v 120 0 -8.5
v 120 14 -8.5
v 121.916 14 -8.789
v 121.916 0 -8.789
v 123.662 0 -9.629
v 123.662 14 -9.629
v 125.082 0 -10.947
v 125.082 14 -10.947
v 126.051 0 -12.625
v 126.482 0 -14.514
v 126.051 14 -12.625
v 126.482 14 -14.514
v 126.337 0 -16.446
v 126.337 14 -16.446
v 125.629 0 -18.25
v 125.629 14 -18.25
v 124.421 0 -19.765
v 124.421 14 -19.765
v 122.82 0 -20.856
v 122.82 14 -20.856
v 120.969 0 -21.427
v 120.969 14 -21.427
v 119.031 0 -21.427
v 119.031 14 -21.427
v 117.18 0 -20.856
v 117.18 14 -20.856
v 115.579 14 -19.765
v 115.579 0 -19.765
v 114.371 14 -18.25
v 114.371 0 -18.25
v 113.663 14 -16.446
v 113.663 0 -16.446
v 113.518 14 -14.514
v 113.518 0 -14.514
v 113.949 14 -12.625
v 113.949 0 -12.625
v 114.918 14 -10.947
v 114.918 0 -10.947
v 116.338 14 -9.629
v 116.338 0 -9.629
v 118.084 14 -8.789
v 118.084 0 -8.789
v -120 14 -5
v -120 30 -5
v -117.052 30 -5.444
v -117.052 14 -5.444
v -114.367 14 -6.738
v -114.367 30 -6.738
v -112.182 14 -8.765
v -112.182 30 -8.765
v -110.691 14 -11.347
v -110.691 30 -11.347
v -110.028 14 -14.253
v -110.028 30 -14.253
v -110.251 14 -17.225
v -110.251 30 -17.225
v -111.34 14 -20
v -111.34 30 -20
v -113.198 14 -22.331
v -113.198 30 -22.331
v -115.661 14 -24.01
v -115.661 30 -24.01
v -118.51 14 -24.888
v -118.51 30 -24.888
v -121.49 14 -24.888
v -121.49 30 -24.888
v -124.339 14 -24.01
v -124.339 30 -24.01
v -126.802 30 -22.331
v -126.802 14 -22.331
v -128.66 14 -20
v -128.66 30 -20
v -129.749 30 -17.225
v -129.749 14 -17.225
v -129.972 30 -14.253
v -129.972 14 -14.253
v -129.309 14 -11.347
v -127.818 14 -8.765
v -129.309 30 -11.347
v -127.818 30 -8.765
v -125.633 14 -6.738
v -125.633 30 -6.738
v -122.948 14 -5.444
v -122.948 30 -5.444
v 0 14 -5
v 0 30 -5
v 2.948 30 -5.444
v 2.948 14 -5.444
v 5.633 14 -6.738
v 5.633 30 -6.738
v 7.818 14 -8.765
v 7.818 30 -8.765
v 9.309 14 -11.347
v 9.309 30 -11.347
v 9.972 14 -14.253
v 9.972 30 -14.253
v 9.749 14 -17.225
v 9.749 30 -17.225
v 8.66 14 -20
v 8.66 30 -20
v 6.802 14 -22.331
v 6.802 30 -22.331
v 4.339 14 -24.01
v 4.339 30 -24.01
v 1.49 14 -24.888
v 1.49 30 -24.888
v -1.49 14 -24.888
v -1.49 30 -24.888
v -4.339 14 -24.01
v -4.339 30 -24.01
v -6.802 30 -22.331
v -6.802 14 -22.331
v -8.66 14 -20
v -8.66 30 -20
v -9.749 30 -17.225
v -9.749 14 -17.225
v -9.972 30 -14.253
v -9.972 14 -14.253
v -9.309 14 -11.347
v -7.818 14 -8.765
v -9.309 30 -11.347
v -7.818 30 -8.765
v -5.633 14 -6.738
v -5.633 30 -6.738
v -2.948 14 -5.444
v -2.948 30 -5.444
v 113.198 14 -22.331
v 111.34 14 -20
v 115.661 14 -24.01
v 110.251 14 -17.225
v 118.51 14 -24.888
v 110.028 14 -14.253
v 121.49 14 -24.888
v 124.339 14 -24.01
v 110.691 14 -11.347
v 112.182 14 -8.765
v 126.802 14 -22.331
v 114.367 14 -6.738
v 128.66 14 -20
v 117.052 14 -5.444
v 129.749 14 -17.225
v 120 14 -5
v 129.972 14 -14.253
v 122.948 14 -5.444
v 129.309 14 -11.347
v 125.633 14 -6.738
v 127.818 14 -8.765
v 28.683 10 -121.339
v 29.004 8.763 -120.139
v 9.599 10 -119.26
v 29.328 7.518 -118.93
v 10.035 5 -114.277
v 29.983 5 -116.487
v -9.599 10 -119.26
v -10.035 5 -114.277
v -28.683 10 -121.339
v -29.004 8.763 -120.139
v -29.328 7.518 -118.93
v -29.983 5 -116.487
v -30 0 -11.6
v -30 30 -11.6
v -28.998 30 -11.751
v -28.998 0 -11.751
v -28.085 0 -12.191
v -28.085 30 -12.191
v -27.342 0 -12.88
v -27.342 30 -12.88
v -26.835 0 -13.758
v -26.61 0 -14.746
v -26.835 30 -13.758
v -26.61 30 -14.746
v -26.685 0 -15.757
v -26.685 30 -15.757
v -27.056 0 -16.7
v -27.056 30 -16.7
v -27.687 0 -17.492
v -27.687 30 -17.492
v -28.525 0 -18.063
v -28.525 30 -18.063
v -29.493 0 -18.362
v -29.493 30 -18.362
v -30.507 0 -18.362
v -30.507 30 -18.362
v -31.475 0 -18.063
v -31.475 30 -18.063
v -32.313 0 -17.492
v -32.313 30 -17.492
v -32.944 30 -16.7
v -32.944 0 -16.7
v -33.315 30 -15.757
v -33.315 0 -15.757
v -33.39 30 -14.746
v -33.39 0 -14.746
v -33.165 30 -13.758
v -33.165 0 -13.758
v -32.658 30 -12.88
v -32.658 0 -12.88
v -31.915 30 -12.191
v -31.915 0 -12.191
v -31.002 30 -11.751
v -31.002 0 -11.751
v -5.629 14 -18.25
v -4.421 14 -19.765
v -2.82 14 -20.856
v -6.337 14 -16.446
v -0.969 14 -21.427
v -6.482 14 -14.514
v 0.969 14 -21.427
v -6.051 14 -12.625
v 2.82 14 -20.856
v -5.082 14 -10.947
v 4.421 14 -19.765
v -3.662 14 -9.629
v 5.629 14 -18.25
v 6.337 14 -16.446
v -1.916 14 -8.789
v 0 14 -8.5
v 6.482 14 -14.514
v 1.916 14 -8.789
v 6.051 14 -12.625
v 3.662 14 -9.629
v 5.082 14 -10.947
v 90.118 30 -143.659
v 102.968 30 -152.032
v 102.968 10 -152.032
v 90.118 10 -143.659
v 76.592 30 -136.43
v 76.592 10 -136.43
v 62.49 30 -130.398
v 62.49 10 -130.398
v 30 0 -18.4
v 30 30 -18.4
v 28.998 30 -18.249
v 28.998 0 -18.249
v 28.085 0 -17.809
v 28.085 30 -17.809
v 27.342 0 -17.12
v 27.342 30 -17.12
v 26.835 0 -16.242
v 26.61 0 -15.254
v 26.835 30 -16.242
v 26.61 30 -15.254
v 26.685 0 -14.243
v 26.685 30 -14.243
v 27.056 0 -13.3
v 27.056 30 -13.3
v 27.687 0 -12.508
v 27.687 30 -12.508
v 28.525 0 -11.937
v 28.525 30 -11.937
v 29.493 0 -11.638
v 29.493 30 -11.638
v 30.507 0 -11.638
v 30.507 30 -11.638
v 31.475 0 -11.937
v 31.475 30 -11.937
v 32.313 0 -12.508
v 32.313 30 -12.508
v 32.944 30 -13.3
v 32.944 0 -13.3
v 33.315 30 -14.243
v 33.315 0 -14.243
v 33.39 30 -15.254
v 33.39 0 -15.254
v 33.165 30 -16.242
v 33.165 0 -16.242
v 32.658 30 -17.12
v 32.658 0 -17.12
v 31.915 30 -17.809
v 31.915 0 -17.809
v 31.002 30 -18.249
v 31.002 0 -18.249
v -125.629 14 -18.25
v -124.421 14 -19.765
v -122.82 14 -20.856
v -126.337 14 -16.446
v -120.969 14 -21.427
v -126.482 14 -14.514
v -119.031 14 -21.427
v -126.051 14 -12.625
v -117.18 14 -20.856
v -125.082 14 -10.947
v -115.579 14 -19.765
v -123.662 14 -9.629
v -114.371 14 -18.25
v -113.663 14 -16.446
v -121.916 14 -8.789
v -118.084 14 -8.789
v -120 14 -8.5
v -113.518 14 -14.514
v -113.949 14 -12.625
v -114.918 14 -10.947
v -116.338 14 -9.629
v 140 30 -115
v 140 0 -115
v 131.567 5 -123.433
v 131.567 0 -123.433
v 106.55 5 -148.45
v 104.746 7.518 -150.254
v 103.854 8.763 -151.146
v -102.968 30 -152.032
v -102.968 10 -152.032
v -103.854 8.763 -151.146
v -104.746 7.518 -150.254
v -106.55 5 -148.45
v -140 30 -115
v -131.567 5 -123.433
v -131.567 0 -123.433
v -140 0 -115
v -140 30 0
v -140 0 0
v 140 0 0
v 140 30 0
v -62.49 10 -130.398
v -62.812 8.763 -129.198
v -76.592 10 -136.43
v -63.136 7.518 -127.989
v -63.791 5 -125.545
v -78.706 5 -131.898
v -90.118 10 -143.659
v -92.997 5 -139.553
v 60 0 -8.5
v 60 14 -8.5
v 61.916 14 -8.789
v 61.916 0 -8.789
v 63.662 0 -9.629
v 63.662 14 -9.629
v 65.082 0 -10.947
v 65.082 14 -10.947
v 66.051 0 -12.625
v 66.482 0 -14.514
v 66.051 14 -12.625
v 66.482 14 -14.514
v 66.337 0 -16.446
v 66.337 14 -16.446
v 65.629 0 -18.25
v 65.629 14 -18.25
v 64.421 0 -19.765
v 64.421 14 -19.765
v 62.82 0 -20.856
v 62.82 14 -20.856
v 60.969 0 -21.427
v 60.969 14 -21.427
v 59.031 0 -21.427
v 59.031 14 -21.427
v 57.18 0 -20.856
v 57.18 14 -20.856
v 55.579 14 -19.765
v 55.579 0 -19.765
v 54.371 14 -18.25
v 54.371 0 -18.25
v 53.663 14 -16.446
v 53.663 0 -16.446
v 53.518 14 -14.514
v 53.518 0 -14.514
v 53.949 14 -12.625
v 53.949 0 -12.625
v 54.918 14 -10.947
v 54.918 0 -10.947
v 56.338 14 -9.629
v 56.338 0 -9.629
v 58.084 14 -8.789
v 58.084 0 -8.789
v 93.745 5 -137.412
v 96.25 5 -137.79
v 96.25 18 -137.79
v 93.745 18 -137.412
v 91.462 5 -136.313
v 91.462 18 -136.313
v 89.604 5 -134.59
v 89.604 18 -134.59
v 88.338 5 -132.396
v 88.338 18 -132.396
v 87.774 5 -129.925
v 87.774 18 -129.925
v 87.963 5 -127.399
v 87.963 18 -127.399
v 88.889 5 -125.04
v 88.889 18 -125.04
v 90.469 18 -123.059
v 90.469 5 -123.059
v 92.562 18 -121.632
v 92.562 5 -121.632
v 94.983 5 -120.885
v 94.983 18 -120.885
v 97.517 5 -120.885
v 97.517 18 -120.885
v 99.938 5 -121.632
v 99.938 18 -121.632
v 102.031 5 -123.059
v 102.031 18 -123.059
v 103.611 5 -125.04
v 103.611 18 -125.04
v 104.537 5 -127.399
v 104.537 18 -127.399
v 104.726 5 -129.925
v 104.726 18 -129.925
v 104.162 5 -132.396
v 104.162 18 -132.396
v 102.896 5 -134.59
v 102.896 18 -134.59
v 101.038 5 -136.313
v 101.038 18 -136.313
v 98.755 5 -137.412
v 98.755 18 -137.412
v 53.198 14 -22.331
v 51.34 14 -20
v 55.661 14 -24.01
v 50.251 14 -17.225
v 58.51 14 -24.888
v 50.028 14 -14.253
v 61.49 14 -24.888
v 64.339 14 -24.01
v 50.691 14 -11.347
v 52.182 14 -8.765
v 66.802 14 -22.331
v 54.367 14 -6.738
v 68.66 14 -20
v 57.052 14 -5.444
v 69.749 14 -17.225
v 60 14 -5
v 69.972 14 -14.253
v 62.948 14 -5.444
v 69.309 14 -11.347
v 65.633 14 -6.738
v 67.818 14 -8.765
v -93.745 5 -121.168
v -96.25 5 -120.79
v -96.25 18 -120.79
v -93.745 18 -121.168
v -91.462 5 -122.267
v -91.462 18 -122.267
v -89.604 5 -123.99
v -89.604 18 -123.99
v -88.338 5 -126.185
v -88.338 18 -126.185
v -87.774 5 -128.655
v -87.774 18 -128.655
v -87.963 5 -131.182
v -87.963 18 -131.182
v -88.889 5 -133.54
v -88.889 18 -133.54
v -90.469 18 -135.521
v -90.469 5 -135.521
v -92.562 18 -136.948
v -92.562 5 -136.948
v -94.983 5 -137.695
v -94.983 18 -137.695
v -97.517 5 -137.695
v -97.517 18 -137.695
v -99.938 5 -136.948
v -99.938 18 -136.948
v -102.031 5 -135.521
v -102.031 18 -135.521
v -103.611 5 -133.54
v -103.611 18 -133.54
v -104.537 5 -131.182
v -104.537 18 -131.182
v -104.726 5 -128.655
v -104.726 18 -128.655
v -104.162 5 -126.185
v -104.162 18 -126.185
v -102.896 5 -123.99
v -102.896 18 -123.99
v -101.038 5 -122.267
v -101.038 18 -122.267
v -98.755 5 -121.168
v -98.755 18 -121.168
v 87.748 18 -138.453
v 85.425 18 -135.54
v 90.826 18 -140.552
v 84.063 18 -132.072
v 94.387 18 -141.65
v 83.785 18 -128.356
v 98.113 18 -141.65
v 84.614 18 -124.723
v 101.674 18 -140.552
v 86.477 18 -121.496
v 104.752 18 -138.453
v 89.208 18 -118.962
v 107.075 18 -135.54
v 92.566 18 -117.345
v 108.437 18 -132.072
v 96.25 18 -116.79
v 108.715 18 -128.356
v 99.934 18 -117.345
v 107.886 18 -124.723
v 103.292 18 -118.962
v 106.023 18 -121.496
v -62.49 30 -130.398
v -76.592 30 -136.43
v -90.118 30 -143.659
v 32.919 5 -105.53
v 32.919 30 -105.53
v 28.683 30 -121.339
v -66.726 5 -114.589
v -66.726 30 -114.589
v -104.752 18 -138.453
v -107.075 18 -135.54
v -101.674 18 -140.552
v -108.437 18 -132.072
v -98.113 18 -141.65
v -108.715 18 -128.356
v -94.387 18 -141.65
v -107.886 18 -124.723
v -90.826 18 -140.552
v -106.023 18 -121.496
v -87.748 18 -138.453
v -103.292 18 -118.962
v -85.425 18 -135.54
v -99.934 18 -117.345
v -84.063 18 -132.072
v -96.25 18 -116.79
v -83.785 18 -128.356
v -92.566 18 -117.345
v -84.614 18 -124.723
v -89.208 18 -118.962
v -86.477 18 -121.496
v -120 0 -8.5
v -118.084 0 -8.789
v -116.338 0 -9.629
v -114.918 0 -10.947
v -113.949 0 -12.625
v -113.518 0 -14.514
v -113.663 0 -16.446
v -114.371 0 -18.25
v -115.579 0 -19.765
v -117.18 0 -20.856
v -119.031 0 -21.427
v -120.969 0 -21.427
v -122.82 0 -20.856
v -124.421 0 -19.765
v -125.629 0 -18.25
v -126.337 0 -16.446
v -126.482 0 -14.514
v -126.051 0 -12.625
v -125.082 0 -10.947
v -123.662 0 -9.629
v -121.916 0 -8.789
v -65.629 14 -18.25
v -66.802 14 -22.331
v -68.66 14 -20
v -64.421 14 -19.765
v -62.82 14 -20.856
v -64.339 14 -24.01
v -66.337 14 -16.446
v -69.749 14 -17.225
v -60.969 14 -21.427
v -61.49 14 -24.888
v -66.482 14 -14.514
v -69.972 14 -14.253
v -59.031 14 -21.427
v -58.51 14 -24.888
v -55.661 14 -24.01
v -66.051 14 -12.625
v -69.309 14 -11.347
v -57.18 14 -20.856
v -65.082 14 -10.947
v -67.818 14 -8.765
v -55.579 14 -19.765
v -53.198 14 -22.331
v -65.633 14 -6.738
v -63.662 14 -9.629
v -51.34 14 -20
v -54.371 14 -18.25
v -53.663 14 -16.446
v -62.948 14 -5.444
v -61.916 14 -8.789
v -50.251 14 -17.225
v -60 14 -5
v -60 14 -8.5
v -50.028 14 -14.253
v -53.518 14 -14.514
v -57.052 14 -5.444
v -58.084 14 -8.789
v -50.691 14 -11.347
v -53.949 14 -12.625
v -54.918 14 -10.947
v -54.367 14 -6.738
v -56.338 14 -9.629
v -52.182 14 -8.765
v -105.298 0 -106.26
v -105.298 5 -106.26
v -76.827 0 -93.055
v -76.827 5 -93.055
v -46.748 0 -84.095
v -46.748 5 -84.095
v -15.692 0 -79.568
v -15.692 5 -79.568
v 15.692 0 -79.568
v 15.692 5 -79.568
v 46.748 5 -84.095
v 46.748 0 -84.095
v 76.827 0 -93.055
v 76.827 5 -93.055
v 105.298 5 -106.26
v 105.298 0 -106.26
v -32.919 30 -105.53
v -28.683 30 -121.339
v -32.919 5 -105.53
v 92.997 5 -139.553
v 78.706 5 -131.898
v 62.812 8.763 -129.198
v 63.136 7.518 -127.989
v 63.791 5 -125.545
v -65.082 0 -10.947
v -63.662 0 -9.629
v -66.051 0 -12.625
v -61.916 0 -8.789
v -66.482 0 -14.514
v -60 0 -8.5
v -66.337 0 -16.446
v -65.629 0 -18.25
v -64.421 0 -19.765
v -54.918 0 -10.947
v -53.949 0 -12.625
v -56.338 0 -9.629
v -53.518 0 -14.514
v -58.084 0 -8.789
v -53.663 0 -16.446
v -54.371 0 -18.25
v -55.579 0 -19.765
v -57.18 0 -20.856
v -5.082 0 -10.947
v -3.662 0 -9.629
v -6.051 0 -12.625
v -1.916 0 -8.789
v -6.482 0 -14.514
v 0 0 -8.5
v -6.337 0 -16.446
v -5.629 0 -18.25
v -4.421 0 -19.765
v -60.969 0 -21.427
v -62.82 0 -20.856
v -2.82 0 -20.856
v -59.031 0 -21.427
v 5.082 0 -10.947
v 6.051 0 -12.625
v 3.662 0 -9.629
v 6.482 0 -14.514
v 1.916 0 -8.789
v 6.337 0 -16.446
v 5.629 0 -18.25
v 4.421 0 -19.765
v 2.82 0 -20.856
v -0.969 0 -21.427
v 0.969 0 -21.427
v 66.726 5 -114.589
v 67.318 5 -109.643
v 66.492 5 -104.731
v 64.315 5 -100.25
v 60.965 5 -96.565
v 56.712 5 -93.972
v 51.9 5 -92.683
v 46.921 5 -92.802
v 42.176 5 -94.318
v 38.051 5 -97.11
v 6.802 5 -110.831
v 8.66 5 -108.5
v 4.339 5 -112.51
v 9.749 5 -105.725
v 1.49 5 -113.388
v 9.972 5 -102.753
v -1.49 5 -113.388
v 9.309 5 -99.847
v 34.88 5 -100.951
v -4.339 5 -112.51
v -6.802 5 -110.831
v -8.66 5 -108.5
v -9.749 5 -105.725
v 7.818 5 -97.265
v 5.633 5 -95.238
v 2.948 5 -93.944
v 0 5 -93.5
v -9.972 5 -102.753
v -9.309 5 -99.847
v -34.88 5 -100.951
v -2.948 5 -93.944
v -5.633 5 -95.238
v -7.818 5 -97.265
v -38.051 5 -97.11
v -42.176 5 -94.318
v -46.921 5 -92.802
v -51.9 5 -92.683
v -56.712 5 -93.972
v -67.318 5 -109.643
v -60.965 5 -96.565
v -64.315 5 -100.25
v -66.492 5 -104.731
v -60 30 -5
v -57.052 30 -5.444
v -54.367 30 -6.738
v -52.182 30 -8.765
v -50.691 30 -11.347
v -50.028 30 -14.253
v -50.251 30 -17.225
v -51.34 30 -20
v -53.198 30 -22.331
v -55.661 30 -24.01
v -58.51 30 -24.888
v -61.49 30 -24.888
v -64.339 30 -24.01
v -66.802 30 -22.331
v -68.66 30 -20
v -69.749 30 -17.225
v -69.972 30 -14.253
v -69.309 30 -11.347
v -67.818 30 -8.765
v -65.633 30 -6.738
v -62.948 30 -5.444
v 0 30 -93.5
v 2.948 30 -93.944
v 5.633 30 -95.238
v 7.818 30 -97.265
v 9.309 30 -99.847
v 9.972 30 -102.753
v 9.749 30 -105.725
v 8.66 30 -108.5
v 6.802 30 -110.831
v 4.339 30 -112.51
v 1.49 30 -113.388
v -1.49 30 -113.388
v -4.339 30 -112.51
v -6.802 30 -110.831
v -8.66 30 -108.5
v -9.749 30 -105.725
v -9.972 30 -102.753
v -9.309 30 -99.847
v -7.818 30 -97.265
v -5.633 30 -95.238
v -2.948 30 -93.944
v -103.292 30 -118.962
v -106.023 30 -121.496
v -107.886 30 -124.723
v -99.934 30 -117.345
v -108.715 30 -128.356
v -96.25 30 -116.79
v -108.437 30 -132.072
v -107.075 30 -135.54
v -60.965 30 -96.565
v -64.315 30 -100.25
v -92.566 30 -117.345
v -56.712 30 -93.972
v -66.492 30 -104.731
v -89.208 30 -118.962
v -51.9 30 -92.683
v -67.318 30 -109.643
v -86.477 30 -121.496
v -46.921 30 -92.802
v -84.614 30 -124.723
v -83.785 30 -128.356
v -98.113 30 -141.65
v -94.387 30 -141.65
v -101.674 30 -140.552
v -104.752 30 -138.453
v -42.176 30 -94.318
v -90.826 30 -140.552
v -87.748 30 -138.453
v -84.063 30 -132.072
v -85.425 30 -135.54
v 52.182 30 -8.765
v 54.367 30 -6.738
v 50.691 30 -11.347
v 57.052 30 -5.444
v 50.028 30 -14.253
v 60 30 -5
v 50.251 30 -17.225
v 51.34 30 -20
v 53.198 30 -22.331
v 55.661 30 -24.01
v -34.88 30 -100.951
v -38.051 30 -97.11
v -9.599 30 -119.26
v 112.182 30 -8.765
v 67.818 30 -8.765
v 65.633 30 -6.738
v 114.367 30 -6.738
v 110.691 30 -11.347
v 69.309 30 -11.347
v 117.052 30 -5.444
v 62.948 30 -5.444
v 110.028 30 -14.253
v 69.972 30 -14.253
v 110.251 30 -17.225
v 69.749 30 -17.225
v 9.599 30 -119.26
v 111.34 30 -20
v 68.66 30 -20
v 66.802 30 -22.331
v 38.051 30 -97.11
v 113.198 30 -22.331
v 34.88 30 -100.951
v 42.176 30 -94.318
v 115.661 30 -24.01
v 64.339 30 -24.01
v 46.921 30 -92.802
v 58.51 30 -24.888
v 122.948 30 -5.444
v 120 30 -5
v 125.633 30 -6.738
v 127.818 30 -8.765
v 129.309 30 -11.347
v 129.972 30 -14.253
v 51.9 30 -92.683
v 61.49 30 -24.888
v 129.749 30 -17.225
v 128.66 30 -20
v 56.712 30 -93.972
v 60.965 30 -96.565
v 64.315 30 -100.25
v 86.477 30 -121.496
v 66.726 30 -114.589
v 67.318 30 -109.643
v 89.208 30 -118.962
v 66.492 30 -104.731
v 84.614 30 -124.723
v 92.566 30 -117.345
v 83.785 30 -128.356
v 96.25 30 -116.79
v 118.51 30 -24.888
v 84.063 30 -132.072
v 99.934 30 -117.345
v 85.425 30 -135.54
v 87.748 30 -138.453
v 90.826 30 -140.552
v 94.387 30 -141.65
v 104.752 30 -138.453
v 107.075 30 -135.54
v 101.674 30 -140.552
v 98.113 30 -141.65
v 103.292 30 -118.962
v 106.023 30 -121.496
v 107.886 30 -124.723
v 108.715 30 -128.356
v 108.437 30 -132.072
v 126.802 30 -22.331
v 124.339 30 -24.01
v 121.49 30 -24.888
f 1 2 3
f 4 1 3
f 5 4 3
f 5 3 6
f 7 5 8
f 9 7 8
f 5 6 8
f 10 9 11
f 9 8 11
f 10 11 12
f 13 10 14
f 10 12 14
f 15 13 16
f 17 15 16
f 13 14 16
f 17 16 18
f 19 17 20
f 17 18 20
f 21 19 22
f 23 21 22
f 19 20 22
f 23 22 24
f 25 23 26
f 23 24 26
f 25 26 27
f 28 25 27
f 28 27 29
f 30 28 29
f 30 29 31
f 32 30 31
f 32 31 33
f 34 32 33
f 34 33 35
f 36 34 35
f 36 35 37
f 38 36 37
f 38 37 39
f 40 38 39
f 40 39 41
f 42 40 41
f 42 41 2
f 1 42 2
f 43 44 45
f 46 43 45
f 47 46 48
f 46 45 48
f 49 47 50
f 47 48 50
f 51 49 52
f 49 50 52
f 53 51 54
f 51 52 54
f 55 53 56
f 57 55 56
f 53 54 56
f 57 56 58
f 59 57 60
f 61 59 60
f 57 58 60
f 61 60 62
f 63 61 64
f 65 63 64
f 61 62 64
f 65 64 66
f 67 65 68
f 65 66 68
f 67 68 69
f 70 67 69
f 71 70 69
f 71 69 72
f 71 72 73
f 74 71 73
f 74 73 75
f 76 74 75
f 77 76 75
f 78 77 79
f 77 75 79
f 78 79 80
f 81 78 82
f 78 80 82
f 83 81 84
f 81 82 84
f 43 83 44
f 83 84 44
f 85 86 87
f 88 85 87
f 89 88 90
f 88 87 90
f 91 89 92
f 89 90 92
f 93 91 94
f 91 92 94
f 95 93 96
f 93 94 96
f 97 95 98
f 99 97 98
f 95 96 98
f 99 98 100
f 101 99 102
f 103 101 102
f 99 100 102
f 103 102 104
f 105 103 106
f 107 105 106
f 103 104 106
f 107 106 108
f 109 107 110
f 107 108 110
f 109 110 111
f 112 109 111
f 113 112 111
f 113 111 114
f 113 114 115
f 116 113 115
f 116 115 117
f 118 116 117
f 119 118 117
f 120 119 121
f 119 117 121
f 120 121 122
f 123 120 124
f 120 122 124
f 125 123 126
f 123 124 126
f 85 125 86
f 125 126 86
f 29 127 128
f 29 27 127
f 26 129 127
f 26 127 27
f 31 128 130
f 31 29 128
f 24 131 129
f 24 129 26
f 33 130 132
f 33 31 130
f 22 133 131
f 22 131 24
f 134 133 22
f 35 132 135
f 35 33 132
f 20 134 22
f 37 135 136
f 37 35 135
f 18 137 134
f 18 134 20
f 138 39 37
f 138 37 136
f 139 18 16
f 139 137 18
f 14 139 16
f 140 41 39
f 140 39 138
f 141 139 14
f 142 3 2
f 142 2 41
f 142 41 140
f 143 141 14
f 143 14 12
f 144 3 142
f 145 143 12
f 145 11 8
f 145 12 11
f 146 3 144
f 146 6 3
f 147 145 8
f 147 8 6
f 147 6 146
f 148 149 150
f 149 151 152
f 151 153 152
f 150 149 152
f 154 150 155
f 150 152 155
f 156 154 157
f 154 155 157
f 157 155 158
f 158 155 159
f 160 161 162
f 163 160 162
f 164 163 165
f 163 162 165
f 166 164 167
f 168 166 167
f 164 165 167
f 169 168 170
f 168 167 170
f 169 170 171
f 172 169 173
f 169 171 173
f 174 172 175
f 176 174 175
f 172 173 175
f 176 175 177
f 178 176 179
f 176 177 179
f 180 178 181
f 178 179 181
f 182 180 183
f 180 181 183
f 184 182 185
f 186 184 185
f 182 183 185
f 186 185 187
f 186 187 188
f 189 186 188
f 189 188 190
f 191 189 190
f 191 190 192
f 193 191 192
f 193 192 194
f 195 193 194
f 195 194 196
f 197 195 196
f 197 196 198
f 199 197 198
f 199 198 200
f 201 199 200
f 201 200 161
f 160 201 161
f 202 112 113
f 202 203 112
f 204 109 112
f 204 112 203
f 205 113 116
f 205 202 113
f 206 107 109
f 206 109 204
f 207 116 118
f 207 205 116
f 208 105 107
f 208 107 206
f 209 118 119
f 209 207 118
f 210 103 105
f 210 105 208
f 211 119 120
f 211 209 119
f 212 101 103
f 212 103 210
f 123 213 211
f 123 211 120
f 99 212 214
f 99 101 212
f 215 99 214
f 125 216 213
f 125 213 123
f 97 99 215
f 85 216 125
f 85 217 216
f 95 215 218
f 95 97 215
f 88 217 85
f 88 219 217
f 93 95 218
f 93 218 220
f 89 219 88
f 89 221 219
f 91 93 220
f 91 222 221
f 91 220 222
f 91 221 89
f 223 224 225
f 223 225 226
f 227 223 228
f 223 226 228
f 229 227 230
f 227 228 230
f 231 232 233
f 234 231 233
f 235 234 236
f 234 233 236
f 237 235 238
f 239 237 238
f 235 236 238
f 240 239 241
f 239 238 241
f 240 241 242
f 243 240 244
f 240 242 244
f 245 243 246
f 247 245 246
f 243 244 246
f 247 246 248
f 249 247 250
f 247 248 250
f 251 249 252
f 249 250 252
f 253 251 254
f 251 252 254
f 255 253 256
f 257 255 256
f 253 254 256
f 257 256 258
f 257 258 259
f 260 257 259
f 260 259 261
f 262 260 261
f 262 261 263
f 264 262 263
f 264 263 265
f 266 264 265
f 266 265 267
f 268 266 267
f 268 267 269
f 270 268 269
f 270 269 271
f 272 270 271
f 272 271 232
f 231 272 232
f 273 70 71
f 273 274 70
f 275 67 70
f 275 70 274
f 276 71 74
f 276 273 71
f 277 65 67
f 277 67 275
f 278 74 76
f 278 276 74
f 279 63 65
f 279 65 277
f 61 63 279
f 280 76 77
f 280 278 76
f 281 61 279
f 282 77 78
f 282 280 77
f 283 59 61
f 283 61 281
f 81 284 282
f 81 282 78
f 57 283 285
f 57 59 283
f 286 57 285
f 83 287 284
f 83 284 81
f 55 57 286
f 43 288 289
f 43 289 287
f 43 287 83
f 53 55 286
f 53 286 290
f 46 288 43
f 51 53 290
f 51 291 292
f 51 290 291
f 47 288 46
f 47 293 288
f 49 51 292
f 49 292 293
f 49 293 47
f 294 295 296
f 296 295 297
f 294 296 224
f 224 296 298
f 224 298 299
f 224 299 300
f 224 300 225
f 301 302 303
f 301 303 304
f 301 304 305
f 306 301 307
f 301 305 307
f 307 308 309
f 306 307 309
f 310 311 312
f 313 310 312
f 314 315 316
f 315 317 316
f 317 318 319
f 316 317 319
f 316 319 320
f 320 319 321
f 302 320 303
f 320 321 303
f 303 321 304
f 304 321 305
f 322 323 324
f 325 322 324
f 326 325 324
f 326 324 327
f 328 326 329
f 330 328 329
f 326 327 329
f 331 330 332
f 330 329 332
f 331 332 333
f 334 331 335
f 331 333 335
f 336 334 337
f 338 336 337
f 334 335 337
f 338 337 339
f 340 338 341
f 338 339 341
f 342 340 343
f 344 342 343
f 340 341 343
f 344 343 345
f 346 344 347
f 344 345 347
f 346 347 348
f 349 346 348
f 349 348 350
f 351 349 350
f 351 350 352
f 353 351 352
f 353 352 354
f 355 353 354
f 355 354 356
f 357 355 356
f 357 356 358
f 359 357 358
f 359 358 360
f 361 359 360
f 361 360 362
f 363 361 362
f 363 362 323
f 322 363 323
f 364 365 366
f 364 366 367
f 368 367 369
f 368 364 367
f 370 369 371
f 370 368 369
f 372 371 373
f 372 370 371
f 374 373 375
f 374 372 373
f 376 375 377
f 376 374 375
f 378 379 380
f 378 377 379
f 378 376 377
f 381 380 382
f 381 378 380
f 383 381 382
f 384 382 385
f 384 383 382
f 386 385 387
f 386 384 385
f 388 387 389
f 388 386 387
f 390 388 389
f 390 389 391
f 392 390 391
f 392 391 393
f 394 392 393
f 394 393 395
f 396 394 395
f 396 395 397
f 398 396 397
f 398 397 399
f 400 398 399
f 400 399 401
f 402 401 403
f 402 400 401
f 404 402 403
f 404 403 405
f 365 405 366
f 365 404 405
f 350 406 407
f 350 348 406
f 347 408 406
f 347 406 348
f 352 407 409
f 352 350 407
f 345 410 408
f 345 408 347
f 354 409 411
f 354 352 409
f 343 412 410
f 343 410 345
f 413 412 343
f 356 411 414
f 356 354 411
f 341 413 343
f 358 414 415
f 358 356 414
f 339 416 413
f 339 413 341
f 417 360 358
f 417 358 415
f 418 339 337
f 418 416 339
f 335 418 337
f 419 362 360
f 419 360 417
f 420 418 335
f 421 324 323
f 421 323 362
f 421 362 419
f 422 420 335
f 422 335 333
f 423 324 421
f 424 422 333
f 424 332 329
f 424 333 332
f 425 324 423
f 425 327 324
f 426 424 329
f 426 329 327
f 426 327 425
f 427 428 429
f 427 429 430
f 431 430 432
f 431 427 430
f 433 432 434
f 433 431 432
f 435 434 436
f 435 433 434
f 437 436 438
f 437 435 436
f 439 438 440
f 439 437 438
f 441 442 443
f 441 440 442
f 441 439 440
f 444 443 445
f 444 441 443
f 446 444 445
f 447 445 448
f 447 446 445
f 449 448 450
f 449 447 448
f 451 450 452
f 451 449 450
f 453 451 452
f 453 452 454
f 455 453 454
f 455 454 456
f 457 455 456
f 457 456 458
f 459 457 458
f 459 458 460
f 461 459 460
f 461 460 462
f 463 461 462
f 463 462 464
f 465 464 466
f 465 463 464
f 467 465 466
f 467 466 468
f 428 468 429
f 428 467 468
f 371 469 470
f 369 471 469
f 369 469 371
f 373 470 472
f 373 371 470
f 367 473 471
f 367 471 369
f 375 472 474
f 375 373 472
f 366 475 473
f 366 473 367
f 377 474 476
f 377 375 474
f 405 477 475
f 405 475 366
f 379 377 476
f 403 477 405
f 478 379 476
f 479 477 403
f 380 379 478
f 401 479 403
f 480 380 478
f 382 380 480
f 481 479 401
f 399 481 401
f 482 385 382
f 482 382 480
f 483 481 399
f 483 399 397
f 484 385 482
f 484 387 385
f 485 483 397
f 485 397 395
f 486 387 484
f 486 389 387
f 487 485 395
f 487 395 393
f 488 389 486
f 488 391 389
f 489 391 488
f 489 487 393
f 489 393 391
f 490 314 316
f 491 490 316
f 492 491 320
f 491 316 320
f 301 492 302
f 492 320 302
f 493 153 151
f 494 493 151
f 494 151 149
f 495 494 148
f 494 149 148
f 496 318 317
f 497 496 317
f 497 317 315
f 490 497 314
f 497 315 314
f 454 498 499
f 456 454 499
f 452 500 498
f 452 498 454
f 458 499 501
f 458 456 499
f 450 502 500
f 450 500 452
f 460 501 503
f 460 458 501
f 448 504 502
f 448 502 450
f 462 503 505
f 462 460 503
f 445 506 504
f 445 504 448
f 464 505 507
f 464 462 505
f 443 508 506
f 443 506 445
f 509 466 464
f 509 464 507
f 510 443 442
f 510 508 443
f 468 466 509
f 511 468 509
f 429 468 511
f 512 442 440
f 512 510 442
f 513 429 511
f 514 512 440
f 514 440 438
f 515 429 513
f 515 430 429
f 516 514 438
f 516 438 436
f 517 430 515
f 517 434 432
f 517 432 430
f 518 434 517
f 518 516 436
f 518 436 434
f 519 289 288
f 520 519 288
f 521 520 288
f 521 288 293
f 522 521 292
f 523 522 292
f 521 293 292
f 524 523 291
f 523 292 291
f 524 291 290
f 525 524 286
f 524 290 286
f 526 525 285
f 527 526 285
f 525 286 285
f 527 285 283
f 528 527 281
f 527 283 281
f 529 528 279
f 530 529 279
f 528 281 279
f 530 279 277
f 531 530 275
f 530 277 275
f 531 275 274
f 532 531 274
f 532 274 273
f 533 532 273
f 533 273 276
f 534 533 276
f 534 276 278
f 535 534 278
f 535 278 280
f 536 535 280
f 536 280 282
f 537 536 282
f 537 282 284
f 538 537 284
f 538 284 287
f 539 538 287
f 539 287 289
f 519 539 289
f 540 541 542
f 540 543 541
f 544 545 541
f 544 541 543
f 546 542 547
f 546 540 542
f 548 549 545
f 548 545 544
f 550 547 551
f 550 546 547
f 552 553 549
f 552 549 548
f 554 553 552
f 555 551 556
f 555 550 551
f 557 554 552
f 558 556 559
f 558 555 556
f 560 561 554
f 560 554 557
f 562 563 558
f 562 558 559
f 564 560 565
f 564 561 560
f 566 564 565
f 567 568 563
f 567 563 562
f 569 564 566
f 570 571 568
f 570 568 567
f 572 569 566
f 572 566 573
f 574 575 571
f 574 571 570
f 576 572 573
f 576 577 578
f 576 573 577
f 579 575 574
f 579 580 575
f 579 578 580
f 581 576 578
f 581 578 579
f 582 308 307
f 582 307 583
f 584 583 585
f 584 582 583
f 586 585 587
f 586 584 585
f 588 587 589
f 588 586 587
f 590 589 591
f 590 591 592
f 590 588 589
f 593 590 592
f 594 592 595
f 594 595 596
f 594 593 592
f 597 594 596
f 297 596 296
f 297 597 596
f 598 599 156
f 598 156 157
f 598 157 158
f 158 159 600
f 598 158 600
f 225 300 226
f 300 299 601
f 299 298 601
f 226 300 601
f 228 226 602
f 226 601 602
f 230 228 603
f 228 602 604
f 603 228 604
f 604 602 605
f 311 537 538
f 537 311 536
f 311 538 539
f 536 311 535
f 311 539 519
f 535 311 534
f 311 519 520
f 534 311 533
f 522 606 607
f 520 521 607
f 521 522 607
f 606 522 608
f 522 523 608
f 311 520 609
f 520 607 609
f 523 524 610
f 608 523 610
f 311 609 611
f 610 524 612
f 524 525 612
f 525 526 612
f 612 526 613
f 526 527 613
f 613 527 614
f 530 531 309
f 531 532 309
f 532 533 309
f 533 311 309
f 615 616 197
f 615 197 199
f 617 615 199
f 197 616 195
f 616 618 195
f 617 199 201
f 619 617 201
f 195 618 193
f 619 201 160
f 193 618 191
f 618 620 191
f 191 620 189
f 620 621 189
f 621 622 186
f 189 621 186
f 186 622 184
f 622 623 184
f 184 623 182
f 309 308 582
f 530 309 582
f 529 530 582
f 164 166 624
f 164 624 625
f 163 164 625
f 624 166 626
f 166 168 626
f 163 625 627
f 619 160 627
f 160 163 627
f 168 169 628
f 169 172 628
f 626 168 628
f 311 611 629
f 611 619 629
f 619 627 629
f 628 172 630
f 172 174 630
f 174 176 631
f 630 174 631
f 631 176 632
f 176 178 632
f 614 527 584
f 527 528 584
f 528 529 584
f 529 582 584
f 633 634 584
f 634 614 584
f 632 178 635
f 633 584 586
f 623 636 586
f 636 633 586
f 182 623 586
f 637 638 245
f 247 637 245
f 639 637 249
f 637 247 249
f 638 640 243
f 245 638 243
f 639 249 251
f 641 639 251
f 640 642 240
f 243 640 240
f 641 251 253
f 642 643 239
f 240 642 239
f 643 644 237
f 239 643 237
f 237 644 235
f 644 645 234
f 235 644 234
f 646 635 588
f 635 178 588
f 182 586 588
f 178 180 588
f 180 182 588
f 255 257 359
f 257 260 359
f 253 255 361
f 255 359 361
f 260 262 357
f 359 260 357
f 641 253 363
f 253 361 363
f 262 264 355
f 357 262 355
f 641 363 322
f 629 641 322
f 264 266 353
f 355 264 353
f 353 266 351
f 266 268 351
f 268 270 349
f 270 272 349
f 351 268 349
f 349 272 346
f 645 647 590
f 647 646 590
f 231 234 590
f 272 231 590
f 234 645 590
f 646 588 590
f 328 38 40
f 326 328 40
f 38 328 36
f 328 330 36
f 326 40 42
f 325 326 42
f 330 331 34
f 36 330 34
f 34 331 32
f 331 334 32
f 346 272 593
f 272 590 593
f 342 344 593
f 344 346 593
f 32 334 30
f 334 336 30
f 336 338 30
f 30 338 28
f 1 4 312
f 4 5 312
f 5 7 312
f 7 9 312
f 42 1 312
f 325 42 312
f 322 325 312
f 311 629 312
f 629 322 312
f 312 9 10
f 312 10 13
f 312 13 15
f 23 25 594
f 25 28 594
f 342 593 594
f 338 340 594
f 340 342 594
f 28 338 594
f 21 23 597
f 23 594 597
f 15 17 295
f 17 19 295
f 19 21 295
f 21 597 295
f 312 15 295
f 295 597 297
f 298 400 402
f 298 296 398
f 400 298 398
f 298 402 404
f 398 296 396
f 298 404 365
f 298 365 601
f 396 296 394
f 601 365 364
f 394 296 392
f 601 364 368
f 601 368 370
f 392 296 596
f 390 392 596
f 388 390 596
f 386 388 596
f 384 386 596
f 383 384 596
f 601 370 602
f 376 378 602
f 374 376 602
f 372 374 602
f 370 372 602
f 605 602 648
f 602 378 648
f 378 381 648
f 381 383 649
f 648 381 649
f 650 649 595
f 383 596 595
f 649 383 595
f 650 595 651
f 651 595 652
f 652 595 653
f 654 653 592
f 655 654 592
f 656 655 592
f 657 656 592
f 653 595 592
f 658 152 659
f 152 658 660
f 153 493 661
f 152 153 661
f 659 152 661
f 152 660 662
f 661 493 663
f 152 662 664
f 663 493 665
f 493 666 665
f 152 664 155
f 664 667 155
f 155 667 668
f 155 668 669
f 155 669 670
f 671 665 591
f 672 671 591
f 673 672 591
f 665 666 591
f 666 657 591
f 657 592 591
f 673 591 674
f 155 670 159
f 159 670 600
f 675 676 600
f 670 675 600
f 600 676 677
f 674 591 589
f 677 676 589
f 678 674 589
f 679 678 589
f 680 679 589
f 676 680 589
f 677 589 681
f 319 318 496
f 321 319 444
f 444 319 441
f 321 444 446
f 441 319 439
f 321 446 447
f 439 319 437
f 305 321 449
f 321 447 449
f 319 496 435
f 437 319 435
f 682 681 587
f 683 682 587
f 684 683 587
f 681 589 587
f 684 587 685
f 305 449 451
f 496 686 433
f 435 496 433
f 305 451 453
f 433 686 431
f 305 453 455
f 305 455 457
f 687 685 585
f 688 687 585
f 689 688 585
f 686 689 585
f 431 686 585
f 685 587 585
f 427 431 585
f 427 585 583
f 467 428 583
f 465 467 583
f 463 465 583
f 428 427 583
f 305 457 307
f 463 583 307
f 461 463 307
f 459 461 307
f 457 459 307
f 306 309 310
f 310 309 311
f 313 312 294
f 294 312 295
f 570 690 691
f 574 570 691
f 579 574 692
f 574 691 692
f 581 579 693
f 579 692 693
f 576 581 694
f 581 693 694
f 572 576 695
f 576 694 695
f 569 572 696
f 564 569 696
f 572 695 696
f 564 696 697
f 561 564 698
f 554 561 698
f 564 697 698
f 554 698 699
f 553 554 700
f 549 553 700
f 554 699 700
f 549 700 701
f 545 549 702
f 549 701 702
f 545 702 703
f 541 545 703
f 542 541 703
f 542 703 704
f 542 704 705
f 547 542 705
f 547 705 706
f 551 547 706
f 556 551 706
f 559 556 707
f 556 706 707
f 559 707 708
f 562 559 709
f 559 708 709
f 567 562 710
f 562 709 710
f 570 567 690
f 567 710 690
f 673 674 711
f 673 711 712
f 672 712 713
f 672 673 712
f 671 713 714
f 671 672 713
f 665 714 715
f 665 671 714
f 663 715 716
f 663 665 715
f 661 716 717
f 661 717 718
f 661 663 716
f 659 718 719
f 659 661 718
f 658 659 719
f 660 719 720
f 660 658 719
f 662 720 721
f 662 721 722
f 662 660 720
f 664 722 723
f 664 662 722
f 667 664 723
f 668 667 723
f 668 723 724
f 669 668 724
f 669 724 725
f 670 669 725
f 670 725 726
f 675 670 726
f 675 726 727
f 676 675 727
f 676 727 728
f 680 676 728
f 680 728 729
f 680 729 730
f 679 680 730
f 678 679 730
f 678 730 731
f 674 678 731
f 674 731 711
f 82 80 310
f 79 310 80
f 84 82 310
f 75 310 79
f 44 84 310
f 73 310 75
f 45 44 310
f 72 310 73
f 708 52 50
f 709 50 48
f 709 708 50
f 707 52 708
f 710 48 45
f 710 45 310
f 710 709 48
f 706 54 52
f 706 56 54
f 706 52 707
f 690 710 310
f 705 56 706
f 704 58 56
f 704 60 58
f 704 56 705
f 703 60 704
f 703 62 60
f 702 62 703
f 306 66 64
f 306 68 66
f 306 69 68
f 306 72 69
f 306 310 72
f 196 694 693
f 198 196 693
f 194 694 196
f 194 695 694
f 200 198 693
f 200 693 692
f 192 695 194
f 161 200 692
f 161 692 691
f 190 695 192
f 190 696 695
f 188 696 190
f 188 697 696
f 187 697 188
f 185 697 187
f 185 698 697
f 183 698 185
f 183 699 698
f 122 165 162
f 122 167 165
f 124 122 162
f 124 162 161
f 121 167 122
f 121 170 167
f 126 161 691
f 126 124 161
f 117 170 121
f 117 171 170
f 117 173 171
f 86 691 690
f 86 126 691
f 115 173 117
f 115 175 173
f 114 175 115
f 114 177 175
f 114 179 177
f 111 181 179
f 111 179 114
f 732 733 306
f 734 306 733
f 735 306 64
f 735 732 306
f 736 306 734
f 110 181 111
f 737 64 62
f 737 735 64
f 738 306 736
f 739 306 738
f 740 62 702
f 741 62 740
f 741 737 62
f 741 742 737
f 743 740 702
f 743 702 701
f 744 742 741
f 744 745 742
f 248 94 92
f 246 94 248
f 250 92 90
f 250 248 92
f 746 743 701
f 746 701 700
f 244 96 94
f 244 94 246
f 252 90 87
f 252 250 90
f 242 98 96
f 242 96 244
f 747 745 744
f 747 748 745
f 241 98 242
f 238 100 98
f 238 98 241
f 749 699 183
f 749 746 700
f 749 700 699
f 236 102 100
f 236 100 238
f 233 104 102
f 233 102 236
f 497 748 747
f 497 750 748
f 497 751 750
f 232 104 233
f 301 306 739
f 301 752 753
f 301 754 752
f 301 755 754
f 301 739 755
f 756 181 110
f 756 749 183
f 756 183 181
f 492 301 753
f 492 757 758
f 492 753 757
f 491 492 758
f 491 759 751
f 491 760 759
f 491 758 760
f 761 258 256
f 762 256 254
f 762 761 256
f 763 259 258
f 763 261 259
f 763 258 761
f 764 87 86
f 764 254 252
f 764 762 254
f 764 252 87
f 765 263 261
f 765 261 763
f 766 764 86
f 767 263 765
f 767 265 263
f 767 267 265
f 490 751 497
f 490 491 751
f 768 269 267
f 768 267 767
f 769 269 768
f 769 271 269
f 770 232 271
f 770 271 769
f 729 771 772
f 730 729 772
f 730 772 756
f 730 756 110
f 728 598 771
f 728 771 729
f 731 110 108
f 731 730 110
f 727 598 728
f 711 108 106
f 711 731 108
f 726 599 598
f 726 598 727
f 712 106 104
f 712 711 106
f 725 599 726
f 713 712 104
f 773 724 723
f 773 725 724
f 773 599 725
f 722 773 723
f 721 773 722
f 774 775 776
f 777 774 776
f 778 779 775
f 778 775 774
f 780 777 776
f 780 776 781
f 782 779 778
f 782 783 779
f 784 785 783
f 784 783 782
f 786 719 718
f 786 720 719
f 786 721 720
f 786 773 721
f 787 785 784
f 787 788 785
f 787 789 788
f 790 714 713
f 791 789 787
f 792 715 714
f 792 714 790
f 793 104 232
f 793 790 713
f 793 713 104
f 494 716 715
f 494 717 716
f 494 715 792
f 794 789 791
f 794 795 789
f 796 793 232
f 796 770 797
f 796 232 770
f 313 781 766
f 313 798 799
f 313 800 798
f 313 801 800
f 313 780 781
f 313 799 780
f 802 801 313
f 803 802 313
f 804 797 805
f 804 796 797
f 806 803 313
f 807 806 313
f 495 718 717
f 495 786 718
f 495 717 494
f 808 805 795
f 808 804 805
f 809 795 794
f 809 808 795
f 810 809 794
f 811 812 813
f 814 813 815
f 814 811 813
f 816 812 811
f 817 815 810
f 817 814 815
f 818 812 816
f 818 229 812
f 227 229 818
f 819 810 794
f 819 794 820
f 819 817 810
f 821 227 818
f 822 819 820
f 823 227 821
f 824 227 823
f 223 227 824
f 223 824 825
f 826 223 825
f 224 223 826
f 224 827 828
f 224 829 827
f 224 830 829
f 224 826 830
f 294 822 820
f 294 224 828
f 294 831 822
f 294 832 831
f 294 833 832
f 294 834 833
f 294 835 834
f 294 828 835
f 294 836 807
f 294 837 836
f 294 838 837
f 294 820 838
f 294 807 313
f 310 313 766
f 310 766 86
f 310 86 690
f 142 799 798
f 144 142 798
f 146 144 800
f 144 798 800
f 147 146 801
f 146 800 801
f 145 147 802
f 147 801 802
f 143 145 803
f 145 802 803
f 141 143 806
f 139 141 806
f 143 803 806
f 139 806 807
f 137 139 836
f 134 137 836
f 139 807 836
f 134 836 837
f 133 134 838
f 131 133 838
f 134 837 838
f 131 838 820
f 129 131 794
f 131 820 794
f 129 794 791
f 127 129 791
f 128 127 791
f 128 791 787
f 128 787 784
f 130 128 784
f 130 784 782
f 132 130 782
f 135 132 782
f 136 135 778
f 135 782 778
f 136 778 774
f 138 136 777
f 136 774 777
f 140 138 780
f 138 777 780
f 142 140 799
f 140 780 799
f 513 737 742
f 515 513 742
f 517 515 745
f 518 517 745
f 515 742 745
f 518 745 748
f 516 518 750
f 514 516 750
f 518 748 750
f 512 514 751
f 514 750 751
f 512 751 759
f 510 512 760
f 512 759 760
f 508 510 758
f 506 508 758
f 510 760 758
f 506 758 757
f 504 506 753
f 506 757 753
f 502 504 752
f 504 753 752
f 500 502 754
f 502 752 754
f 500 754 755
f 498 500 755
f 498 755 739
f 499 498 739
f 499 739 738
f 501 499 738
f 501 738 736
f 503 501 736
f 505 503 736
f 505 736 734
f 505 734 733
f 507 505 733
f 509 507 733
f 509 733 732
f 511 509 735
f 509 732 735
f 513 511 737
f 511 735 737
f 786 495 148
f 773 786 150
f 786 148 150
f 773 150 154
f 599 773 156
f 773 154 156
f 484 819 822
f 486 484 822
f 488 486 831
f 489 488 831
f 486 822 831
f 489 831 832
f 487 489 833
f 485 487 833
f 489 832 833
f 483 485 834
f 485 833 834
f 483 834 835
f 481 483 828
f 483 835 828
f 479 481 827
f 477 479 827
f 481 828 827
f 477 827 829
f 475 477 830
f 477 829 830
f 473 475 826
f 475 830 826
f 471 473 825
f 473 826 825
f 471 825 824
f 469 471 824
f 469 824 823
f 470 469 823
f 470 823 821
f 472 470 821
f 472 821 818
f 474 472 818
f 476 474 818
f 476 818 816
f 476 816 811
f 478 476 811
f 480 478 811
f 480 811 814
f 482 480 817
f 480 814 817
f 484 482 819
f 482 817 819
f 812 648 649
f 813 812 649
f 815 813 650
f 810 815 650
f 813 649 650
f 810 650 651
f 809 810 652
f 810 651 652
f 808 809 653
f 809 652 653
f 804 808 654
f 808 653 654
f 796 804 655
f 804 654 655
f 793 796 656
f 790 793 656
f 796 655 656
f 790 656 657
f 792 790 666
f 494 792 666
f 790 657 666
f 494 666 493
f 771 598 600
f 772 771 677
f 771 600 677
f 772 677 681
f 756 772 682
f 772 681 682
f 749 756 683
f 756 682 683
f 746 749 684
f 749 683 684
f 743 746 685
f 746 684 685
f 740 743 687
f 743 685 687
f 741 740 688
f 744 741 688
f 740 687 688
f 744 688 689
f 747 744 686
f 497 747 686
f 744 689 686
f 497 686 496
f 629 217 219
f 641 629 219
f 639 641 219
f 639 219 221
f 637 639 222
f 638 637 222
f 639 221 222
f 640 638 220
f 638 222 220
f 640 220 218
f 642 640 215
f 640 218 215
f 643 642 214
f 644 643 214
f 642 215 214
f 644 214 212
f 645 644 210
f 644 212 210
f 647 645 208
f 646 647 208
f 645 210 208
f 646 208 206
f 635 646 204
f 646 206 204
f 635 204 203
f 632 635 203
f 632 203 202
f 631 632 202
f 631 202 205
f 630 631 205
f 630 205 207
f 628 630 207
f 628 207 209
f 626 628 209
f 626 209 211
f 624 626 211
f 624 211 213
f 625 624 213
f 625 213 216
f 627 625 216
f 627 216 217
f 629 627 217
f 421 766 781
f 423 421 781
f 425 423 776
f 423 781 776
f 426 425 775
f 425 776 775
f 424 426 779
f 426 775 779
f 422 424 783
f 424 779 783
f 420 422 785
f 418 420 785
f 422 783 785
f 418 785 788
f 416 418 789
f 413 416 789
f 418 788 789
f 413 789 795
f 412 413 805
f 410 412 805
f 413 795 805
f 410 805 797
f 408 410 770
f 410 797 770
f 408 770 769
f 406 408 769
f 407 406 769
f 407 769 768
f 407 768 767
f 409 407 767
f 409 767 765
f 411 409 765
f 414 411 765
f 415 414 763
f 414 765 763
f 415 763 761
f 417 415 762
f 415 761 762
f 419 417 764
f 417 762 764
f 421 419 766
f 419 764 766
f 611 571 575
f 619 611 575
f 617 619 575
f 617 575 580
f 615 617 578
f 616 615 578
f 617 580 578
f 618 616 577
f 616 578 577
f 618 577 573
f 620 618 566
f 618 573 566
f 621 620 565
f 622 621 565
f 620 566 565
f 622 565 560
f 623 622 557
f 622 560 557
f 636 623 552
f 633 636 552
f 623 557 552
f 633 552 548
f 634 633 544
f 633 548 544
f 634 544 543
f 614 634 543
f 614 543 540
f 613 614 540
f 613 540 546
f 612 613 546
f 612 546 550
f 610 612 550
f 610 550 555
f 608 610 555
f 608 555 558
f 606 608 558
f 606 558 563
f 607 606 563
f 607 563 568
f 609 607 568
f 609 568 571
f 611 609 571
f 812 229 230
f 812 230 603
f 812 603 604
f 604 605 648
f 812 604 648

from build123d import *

# Parameters (mm, degrees)
SKETCH_1_R             = 10
SKETCH_1_R_2           = 8.5
EXTRUDE_1_DEPTH        = 30
SKETCH_3_R             = 12.5
CUT_EXTRUDE_1_DEPTH    = 12
CUT_EXTRUDE_2_REACH    = 210.839
SKETCH_4_R             = 6.5
SKETCH_5_R             = 10
CUT_EXTRUDE_3_DEPTH    = 16
PATTERN_LINEAR_1_COUNT = 5
PATTERN_LINEAR_1_PITCH = 60
CUT_EXTRUDE_4_REACH    = 210.839
SKETCH_6_R             = 3.4
CUT_EXTRUDE_5_DEPTH    = 5
CHAMFER_1_SIZE         = 5


with BuildPart() as part:
    # 草图1 → 凸台-拉伸1 (new body)
    with BuildSketch(Plane(origin=(0, 0, 0), x_dir=(1, 0, 0), z_dir=(0, 1, 0))):
        with BuildLine():
            Line((-140, 0), (140, 0))
            Line((140, 0), (140, 115))
            Line((140, 115), (102.967607088, 152.032392912))
            ThreePointArc((102.967607088, 152.032392912), (83.433104198, 139.897735045), (62.490215343, 130.398149206))
            Line((62.490215343, 130.398149206), (66.726368142, 114.588611729))
            ThreePointArc((66.726368142, 114.588611729), (54.351999472, 93.155576479), (32.918964222, 105.52994515))
            Line((32.918964222, 105.52994515), (28.682811422, 121.339482627))
            ThreePointArc((28.682811422, 121.339482627), (0, 119), (-28.682811422, 121.339482627))
            Line((-28.682811422, 121.339482627), (-32.918964222, 105.52994515))
            ThreePointArc((-32.918964222, 105.52994515), (-54.351999472, 93.155576479), (-66.726368142, 114.588611729))
            Line((-66.726368142, 114.588611729), (-62.490215343, 130.398149206))
            ThreePointArc((-62.490215343, 130.398149206), (-83.433104198, 139.897735045), (-102.967607088, 152.032392912))
            Line((-102.967607088, 152.032392912), (-140, 115))
            Line((-140, 115), (-140, 0))
        make_face()
        with Locations(Location((0, 103.5, 0), (0, 0, 270))):
            Circle(SKETCH_1_R, mode=Mode.SUBTRACT)
        with Locations(Location((-96.25, 129.290109771, 0), (0, 0, 270))):
            Circle(SKETCH_1_R_2, mode=Mode.SUBTRACT)
        with Locations(Location((96.25, 129.290109771, 0), (0, 0, 90))):
            Circle(SKETCH_1_R_2, mode=Mode.SUBTRACT)
    extrude(amount=EXTRUDE_1_DEPTH)

    # 草图3 → 切除-拉伸1 (cut)
    with BuildSketch(Plane(origin=(0, 30, 0), x_dir=(1, 0, 0), z_dir=(0, 1, 0))):
        with Locations(Location((-96.25, 129.290109771, 0), (0, 0, 270))):
            Circle(SKETCH_3_R)
        with Locations(Location((96.25, 129.290109771, 0), (0, 0, 270))):
            Circle(SKETCH_3_R)
    extrude(amount=-CUT_EXTRUDE_1_DEPTH, mode=Mode.SUBTRACT)

    # 草图4 → 切除-拉伸2 (cut, up to next)
    with BuildSketch(Plane(origin=(0, 30, 0), x_dir=(1, 0, 0), z_dir=(0, 1, 0)), mode=Mode.PRIVATE) as cut_extrude_2_sk1:
        with Locations(Location((-120, 15, 0), (0, 0, 270))):
            Circle(SKETCH_4_R)
    cut_extrude_2_tool1 = extrude(cut_extrude_2_sk1.sketch, amount=-CUT_EXTRUDE_2_REACH, mode=Mode.PRIVATE) & part.part
    cut_extrude_2 = cut_extrude_2_tool1.solids().sort_by_distance((-120, 30, -15))[0]
    add(cut_extrude_2, mode=Mode.SUBTRACT)

    # 草图5 → 切除-拉伸3 (cut)
    with BuildSketch(Plane(origin=(0, 30, 0), x_dir=(1, 0, 0), z_dir=(0, 1, 0))):
        with Locations(Location((-120, 15, 0), (0, 0, 270))):
            Circle(SKETCH_5_R)
    cut_extrude_3 = extrude(amount=-CUT_EXTRUDE_3_DEPTH, mode=Mode.SUBTRACT)

    # 阵列(线性)1: 切除-拉伸2, 切除-拉伸3 ×5
    with Locations(*[(i * PATTERN_LINEAR_1_PITCH, 0, 0) for i in range(1, PATTERN_LINEAR_1_COUNT)]):
        add(cut_extrude_2, mode=Mode.SUBTRACT)
        add(cut_extrude_3, mode=Mode.SUBTRACT)

    # 草图6 → 切除-拉伸4 (cut, up to next)
    with BuildSketch(Plane(origin=(0, 30, 0), x_dir=(1, 0, 0), z_dir=(0, 1, 0)), mode=Mode.PRIVATE) as cut_extrude_4_sk1:
        with Locations(Location((-30, 15, 0), (0, 0, 270))):
            Circle(SKETCH_6_R)
    cut_extrude_4_tool1 = extrude(cut_extrude_4_sk1.sketch, amount=-CUT_EXTRUDE_4_REACH, mode=Mode.PRIVATE) & part.part
    # 草图6 → 切除-拉伸4 (cut, up to next)
    with BuildSketch(Plane(origin=(0, 30, 0), x_dir=(1, 0, 0), z_dir=(0, 1, 0)), mode=Mode.PRIVATE) as cut_extrude_4_sk2:
        with Locations(Location((30, 15, 0), (0, 0, 90))):
            Circle(SKETCH_6_R)
    cut_extrude_4_tool2 = extrude(cut_extrude_4_sk2.sketch, amount=-CUT_EXTRUDE_4_REACH, mode=Mode.PRIVATE) & part.part
    add(cut_extrude_4_tool1.solids().sort_by_distance((-30, 30, -15))[0], mode=Mode.SUBTRACT)
    add(cut_extrude_4_tool2.solids().sort_by_distance((30, 30, -15))[0], mode=Mode.SUBTRACT)

    # 草图7 → 切除-拉伸5 (cut)
    with BuildSketch(Plane.XZ):
        with BuildLine():
            Line((131.566597253, -123.433402747), (131.566597253, -152.032392912))
            Line((131.566597253, -152.032392912), (-131.566597253, -152.032392912))
            Line((-131.566597253, -152.032392912), (-131.566597253, -123.433402747))
            ThreePointArc((-131.566597253, -123.433402747), (0, -79), (131.566597253, -123.433402747))
        make_face()
    extrude(amount=-CUT_EXTRUDE_5_DEPTH, mode=Mode.SUBTRACT)

    # 倒角1
    chamfer_1_edges = [part.edges().sort_by_distance(p)[0] for p in [
        (83.433104198, 5, -139.897735045),
        (-83.433104198, 5, -139.897735045),
        (0, 5, -119),
    ]]
    chamfer(chamfer_1_edges, length=CHAMFER_1_SIZE)


solid = part.part
